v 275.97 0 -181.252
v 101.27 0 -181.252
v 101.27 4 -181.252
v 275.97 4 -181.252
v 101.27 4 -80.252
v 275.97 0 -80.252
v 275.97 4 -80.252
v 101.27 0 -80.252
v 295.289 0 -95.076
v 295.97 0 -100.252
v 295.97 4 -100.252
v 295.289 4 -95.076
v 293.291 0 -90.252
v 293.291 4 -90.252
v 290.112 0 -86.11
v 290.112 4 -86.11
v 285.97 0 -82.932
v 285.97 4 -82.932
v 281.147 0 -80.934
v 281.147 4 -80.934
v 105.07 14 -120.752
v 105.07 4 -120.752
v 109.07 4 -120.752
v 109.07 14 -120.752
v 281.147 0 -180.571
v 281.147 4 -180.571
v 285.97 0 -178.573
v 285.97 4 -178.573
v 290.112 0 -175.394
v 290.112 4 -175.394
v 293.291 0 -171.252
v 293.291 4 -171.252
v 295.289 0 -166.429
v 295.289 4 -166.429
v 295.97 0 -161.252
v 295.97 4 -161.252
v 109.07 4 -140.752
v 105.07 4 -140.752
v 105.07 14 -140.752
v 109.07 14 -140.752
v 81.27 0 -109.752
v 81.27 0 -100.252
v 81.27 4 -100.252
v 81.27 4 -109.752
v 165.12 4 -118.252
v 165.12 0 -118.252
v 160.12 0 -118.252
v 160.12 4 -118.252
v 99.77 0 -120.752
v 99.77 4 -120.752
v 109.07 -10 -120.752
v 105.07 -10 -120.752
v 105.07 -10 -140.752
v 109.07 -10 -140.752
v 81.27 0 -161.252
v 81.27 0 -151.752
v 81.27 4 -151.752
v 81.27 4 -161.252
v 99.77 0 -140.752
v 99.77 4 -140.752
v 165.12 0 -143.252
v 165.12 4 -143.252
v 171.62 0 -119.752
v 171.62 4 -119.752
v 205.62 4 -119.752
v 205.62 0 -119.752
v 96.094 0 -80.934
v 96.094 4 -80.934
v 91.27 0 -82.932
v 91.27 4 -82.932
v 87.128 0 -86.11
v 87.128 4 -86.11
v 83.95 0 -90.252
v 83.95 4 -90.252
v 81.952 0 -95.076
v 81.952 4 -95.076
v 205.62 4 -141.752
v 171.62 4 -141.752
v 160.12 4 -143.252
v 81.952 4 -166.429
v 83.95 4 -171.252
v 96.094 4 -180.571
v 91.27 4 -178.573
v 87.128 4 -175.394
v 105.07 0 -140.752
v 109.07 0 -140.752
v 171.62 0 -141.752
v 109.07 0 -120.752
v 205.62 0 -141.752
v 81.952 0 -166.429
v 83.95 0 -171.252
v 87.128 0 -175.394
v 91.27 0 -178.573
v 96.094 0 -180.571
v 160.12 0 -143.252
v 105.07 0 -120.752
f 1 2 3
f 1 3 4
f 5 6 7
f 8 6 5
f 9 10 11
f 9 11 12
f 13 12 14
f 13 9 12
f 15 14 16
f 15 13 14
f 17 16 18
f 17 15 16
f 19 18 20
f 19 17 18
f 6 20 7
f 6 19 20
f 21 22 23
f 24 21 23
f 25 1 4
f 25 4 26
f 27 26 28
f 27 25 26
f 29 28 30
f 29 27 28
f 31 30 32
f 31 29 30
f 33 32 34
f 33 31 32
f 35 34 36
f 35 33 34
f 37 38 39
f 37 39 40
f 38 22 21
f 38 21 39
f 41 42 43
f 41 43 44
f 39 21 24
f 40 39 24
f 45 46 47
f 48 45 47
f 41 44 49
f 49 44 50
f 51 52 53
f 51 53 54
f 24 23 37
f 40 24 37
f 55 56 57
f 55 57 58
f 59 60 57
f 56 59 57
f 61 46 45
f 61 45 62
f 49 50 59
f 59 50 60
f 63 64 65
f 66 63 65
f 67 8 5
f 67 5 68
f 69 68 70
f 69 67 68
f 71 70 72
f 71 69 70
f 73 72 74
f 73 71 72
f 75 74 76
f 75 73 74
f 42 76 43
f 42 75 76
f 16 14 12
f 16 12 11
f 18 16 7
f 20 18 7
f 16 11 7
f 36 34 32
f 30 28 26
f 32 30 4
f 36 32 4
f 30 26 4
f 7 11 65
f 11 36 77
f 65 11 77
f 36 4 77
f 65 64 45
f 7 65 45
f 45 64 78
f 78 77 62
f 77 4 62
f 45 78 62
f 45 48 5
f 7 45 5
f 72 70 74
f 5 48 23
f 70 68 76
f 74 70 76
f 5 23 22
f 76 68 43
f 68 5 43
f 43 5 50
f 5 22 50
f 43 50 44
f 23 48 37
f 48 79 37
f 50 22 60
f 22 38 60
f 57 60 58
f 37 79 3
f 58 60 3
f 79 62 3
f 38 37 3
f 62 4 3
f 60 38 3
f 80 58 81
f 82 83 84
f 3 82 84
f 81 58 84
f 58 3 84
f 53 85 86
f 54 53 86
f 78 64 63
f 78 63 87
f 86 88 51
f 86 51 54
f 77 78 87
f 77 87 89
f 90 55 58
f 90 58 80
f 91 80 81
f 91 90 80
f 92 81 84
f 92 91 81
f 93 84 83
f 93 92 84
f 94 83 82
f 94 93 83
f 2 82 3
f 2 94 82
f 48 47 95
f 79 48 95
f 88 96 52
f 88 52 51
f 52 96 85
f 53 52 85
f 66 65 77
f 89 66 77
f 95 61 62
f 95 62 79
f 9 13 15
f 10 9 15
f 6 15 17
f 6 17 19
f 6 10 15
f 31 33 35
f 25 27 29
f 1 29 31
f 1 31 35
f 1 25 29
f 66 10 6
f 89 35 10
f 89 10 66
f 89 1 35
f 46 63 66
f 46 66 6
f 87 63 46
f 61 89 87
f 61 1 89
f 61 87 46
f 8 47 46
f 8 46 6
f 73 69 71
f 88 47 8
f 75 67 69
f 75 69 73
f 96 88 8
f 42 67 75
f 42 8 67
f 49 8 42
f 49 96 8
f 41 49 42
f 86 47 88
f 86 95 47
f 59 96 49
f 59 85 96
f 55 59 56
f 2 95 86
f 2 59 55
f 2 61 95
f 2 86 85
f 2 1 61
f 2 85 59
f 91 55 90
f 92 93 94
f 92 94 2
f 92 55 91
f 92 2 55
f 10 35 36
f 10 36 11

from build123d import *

# Parameters (mm, degrees)
BOSS_EXTRUDE7_DEPTH      = 4
SKETCH3_W                = 34
SKETCH3_H                = 22
CUT_EXTRUDE2_DEPTH       = 4
CUT_EXTRUDE3_DEPTH       = 4
SKETCH7_W                = 4
SKETCH7_H                = 20
BOSS_EXTRUDE9_DEPTH      = 10
BOSS_EXTRUDE9_DEPTH_BACK = 14
SKETCH9_W                = 5
SKETCH9_H                = 25
CUT_EXTRUDE4_DEPTH       = 4


with BuildPart() as part:
    # Sketch1 → Boss-Extrude7 (new body)
    with BuildSketch(Plane(origin=(0, 0, 0), x_dir=(1, 0, 0), z_dir=(0, 1, 0))):
        with BuildLine():
            Line((101.270150391, 181.252283774), (275.970150391, 181.252283774))
            ThreePointArc((275.970150391, 181.252283774), (290.112286015, 175.394419397), (295.970150391, 161.252283774))
            Line((295.970150391, 161.252283774), (295.970150391, 100.252283774))
            ThreePointArc((295.970150391, 100.252283774), (290.112286015, 86.11014815), (275.970150391, 80.252283774))
            Line((275.970150391, 80.252283774), (101.270150391, 80.252283774))
            ThreePointArc((101.270150391, 80.252283774), (87.128014768, 86.11014815), (81.270150391, 100.252283774))
            Line((81.270150391, 100.252283774), (81.270150391, 161.252283774))
            ThreePointArc((81.270150391, 161.252283774), (87.128014768, 175.394419397), (101.270150391, 181.252283774))
        make_face()
    extrude(amount=BOSS_EXTRUDE7_DEPTH)

    # Sketch3 → Cut-Extrude2 (cut)
    with BuildSketch(Plane(origin=(0, 4, 0), x_dir=(1, 0, 0), z_dir=(0, 1, 0))):
        with Locations((188.620150391, 130.752283774)):
            Rectangle(SKETCH3_W, SKETCH3_H)
    extrude(amount=-CUT_EXTRUDE2_DEPTH, mode=Mode.SUBTRACT)

    # Sketch6 → Cut-Extrude3 (cut)
    with BuildSketch(Plane(origin=(0, 4, 0), x_dir=(1, 0, 0), z_dir=(0, 1, 0))):
        Polygon((81.270150391, 151.752283774), (81.270150391, 109.752283774), (99.770150391, 120.752283774), (99.770150391, 140.752283774), align=None)
    extrude(amount=-CUT_EXTRUDE3_DEPTH, mode=Mode.SUBTRACT)

    # Sketch7 → Boss-Extrude9 (add, two sides)
    with BuildSketch(Plane(origin=(0, 4, 0), x_dir=(1, 0, 0), z_dir=(0, 1, 0))) as boss_extrude9_sk:
        with Locations((107.070150391, 130.752283774)):
            Rectangle(SKETCH7_W, SKETCH7_H)
    extrude(amount=BOSS_EXTRUDE9_DEPTH)
    extrude(boss_extrude9_sk.sketch, amount=-BOSS_EXTRUDE9_DEPTH_BACK)

    # Sketch9 → Cut-Extrude4 (cut)
    with BuildSketch(Plane(origin=(0, 0, 0), x_dir=(-1, 0, 0), z_dir=(0, -1, 0))):
        with Locations((-162.620150391, 130.752283774)):
            Rectangle(SKETCH9_W, SKETCH9_H)
    extrude(amount=-CUT_EXTRUDE4_DEPTH, mode=Mode.SUBTRACT)


solid = part.part
